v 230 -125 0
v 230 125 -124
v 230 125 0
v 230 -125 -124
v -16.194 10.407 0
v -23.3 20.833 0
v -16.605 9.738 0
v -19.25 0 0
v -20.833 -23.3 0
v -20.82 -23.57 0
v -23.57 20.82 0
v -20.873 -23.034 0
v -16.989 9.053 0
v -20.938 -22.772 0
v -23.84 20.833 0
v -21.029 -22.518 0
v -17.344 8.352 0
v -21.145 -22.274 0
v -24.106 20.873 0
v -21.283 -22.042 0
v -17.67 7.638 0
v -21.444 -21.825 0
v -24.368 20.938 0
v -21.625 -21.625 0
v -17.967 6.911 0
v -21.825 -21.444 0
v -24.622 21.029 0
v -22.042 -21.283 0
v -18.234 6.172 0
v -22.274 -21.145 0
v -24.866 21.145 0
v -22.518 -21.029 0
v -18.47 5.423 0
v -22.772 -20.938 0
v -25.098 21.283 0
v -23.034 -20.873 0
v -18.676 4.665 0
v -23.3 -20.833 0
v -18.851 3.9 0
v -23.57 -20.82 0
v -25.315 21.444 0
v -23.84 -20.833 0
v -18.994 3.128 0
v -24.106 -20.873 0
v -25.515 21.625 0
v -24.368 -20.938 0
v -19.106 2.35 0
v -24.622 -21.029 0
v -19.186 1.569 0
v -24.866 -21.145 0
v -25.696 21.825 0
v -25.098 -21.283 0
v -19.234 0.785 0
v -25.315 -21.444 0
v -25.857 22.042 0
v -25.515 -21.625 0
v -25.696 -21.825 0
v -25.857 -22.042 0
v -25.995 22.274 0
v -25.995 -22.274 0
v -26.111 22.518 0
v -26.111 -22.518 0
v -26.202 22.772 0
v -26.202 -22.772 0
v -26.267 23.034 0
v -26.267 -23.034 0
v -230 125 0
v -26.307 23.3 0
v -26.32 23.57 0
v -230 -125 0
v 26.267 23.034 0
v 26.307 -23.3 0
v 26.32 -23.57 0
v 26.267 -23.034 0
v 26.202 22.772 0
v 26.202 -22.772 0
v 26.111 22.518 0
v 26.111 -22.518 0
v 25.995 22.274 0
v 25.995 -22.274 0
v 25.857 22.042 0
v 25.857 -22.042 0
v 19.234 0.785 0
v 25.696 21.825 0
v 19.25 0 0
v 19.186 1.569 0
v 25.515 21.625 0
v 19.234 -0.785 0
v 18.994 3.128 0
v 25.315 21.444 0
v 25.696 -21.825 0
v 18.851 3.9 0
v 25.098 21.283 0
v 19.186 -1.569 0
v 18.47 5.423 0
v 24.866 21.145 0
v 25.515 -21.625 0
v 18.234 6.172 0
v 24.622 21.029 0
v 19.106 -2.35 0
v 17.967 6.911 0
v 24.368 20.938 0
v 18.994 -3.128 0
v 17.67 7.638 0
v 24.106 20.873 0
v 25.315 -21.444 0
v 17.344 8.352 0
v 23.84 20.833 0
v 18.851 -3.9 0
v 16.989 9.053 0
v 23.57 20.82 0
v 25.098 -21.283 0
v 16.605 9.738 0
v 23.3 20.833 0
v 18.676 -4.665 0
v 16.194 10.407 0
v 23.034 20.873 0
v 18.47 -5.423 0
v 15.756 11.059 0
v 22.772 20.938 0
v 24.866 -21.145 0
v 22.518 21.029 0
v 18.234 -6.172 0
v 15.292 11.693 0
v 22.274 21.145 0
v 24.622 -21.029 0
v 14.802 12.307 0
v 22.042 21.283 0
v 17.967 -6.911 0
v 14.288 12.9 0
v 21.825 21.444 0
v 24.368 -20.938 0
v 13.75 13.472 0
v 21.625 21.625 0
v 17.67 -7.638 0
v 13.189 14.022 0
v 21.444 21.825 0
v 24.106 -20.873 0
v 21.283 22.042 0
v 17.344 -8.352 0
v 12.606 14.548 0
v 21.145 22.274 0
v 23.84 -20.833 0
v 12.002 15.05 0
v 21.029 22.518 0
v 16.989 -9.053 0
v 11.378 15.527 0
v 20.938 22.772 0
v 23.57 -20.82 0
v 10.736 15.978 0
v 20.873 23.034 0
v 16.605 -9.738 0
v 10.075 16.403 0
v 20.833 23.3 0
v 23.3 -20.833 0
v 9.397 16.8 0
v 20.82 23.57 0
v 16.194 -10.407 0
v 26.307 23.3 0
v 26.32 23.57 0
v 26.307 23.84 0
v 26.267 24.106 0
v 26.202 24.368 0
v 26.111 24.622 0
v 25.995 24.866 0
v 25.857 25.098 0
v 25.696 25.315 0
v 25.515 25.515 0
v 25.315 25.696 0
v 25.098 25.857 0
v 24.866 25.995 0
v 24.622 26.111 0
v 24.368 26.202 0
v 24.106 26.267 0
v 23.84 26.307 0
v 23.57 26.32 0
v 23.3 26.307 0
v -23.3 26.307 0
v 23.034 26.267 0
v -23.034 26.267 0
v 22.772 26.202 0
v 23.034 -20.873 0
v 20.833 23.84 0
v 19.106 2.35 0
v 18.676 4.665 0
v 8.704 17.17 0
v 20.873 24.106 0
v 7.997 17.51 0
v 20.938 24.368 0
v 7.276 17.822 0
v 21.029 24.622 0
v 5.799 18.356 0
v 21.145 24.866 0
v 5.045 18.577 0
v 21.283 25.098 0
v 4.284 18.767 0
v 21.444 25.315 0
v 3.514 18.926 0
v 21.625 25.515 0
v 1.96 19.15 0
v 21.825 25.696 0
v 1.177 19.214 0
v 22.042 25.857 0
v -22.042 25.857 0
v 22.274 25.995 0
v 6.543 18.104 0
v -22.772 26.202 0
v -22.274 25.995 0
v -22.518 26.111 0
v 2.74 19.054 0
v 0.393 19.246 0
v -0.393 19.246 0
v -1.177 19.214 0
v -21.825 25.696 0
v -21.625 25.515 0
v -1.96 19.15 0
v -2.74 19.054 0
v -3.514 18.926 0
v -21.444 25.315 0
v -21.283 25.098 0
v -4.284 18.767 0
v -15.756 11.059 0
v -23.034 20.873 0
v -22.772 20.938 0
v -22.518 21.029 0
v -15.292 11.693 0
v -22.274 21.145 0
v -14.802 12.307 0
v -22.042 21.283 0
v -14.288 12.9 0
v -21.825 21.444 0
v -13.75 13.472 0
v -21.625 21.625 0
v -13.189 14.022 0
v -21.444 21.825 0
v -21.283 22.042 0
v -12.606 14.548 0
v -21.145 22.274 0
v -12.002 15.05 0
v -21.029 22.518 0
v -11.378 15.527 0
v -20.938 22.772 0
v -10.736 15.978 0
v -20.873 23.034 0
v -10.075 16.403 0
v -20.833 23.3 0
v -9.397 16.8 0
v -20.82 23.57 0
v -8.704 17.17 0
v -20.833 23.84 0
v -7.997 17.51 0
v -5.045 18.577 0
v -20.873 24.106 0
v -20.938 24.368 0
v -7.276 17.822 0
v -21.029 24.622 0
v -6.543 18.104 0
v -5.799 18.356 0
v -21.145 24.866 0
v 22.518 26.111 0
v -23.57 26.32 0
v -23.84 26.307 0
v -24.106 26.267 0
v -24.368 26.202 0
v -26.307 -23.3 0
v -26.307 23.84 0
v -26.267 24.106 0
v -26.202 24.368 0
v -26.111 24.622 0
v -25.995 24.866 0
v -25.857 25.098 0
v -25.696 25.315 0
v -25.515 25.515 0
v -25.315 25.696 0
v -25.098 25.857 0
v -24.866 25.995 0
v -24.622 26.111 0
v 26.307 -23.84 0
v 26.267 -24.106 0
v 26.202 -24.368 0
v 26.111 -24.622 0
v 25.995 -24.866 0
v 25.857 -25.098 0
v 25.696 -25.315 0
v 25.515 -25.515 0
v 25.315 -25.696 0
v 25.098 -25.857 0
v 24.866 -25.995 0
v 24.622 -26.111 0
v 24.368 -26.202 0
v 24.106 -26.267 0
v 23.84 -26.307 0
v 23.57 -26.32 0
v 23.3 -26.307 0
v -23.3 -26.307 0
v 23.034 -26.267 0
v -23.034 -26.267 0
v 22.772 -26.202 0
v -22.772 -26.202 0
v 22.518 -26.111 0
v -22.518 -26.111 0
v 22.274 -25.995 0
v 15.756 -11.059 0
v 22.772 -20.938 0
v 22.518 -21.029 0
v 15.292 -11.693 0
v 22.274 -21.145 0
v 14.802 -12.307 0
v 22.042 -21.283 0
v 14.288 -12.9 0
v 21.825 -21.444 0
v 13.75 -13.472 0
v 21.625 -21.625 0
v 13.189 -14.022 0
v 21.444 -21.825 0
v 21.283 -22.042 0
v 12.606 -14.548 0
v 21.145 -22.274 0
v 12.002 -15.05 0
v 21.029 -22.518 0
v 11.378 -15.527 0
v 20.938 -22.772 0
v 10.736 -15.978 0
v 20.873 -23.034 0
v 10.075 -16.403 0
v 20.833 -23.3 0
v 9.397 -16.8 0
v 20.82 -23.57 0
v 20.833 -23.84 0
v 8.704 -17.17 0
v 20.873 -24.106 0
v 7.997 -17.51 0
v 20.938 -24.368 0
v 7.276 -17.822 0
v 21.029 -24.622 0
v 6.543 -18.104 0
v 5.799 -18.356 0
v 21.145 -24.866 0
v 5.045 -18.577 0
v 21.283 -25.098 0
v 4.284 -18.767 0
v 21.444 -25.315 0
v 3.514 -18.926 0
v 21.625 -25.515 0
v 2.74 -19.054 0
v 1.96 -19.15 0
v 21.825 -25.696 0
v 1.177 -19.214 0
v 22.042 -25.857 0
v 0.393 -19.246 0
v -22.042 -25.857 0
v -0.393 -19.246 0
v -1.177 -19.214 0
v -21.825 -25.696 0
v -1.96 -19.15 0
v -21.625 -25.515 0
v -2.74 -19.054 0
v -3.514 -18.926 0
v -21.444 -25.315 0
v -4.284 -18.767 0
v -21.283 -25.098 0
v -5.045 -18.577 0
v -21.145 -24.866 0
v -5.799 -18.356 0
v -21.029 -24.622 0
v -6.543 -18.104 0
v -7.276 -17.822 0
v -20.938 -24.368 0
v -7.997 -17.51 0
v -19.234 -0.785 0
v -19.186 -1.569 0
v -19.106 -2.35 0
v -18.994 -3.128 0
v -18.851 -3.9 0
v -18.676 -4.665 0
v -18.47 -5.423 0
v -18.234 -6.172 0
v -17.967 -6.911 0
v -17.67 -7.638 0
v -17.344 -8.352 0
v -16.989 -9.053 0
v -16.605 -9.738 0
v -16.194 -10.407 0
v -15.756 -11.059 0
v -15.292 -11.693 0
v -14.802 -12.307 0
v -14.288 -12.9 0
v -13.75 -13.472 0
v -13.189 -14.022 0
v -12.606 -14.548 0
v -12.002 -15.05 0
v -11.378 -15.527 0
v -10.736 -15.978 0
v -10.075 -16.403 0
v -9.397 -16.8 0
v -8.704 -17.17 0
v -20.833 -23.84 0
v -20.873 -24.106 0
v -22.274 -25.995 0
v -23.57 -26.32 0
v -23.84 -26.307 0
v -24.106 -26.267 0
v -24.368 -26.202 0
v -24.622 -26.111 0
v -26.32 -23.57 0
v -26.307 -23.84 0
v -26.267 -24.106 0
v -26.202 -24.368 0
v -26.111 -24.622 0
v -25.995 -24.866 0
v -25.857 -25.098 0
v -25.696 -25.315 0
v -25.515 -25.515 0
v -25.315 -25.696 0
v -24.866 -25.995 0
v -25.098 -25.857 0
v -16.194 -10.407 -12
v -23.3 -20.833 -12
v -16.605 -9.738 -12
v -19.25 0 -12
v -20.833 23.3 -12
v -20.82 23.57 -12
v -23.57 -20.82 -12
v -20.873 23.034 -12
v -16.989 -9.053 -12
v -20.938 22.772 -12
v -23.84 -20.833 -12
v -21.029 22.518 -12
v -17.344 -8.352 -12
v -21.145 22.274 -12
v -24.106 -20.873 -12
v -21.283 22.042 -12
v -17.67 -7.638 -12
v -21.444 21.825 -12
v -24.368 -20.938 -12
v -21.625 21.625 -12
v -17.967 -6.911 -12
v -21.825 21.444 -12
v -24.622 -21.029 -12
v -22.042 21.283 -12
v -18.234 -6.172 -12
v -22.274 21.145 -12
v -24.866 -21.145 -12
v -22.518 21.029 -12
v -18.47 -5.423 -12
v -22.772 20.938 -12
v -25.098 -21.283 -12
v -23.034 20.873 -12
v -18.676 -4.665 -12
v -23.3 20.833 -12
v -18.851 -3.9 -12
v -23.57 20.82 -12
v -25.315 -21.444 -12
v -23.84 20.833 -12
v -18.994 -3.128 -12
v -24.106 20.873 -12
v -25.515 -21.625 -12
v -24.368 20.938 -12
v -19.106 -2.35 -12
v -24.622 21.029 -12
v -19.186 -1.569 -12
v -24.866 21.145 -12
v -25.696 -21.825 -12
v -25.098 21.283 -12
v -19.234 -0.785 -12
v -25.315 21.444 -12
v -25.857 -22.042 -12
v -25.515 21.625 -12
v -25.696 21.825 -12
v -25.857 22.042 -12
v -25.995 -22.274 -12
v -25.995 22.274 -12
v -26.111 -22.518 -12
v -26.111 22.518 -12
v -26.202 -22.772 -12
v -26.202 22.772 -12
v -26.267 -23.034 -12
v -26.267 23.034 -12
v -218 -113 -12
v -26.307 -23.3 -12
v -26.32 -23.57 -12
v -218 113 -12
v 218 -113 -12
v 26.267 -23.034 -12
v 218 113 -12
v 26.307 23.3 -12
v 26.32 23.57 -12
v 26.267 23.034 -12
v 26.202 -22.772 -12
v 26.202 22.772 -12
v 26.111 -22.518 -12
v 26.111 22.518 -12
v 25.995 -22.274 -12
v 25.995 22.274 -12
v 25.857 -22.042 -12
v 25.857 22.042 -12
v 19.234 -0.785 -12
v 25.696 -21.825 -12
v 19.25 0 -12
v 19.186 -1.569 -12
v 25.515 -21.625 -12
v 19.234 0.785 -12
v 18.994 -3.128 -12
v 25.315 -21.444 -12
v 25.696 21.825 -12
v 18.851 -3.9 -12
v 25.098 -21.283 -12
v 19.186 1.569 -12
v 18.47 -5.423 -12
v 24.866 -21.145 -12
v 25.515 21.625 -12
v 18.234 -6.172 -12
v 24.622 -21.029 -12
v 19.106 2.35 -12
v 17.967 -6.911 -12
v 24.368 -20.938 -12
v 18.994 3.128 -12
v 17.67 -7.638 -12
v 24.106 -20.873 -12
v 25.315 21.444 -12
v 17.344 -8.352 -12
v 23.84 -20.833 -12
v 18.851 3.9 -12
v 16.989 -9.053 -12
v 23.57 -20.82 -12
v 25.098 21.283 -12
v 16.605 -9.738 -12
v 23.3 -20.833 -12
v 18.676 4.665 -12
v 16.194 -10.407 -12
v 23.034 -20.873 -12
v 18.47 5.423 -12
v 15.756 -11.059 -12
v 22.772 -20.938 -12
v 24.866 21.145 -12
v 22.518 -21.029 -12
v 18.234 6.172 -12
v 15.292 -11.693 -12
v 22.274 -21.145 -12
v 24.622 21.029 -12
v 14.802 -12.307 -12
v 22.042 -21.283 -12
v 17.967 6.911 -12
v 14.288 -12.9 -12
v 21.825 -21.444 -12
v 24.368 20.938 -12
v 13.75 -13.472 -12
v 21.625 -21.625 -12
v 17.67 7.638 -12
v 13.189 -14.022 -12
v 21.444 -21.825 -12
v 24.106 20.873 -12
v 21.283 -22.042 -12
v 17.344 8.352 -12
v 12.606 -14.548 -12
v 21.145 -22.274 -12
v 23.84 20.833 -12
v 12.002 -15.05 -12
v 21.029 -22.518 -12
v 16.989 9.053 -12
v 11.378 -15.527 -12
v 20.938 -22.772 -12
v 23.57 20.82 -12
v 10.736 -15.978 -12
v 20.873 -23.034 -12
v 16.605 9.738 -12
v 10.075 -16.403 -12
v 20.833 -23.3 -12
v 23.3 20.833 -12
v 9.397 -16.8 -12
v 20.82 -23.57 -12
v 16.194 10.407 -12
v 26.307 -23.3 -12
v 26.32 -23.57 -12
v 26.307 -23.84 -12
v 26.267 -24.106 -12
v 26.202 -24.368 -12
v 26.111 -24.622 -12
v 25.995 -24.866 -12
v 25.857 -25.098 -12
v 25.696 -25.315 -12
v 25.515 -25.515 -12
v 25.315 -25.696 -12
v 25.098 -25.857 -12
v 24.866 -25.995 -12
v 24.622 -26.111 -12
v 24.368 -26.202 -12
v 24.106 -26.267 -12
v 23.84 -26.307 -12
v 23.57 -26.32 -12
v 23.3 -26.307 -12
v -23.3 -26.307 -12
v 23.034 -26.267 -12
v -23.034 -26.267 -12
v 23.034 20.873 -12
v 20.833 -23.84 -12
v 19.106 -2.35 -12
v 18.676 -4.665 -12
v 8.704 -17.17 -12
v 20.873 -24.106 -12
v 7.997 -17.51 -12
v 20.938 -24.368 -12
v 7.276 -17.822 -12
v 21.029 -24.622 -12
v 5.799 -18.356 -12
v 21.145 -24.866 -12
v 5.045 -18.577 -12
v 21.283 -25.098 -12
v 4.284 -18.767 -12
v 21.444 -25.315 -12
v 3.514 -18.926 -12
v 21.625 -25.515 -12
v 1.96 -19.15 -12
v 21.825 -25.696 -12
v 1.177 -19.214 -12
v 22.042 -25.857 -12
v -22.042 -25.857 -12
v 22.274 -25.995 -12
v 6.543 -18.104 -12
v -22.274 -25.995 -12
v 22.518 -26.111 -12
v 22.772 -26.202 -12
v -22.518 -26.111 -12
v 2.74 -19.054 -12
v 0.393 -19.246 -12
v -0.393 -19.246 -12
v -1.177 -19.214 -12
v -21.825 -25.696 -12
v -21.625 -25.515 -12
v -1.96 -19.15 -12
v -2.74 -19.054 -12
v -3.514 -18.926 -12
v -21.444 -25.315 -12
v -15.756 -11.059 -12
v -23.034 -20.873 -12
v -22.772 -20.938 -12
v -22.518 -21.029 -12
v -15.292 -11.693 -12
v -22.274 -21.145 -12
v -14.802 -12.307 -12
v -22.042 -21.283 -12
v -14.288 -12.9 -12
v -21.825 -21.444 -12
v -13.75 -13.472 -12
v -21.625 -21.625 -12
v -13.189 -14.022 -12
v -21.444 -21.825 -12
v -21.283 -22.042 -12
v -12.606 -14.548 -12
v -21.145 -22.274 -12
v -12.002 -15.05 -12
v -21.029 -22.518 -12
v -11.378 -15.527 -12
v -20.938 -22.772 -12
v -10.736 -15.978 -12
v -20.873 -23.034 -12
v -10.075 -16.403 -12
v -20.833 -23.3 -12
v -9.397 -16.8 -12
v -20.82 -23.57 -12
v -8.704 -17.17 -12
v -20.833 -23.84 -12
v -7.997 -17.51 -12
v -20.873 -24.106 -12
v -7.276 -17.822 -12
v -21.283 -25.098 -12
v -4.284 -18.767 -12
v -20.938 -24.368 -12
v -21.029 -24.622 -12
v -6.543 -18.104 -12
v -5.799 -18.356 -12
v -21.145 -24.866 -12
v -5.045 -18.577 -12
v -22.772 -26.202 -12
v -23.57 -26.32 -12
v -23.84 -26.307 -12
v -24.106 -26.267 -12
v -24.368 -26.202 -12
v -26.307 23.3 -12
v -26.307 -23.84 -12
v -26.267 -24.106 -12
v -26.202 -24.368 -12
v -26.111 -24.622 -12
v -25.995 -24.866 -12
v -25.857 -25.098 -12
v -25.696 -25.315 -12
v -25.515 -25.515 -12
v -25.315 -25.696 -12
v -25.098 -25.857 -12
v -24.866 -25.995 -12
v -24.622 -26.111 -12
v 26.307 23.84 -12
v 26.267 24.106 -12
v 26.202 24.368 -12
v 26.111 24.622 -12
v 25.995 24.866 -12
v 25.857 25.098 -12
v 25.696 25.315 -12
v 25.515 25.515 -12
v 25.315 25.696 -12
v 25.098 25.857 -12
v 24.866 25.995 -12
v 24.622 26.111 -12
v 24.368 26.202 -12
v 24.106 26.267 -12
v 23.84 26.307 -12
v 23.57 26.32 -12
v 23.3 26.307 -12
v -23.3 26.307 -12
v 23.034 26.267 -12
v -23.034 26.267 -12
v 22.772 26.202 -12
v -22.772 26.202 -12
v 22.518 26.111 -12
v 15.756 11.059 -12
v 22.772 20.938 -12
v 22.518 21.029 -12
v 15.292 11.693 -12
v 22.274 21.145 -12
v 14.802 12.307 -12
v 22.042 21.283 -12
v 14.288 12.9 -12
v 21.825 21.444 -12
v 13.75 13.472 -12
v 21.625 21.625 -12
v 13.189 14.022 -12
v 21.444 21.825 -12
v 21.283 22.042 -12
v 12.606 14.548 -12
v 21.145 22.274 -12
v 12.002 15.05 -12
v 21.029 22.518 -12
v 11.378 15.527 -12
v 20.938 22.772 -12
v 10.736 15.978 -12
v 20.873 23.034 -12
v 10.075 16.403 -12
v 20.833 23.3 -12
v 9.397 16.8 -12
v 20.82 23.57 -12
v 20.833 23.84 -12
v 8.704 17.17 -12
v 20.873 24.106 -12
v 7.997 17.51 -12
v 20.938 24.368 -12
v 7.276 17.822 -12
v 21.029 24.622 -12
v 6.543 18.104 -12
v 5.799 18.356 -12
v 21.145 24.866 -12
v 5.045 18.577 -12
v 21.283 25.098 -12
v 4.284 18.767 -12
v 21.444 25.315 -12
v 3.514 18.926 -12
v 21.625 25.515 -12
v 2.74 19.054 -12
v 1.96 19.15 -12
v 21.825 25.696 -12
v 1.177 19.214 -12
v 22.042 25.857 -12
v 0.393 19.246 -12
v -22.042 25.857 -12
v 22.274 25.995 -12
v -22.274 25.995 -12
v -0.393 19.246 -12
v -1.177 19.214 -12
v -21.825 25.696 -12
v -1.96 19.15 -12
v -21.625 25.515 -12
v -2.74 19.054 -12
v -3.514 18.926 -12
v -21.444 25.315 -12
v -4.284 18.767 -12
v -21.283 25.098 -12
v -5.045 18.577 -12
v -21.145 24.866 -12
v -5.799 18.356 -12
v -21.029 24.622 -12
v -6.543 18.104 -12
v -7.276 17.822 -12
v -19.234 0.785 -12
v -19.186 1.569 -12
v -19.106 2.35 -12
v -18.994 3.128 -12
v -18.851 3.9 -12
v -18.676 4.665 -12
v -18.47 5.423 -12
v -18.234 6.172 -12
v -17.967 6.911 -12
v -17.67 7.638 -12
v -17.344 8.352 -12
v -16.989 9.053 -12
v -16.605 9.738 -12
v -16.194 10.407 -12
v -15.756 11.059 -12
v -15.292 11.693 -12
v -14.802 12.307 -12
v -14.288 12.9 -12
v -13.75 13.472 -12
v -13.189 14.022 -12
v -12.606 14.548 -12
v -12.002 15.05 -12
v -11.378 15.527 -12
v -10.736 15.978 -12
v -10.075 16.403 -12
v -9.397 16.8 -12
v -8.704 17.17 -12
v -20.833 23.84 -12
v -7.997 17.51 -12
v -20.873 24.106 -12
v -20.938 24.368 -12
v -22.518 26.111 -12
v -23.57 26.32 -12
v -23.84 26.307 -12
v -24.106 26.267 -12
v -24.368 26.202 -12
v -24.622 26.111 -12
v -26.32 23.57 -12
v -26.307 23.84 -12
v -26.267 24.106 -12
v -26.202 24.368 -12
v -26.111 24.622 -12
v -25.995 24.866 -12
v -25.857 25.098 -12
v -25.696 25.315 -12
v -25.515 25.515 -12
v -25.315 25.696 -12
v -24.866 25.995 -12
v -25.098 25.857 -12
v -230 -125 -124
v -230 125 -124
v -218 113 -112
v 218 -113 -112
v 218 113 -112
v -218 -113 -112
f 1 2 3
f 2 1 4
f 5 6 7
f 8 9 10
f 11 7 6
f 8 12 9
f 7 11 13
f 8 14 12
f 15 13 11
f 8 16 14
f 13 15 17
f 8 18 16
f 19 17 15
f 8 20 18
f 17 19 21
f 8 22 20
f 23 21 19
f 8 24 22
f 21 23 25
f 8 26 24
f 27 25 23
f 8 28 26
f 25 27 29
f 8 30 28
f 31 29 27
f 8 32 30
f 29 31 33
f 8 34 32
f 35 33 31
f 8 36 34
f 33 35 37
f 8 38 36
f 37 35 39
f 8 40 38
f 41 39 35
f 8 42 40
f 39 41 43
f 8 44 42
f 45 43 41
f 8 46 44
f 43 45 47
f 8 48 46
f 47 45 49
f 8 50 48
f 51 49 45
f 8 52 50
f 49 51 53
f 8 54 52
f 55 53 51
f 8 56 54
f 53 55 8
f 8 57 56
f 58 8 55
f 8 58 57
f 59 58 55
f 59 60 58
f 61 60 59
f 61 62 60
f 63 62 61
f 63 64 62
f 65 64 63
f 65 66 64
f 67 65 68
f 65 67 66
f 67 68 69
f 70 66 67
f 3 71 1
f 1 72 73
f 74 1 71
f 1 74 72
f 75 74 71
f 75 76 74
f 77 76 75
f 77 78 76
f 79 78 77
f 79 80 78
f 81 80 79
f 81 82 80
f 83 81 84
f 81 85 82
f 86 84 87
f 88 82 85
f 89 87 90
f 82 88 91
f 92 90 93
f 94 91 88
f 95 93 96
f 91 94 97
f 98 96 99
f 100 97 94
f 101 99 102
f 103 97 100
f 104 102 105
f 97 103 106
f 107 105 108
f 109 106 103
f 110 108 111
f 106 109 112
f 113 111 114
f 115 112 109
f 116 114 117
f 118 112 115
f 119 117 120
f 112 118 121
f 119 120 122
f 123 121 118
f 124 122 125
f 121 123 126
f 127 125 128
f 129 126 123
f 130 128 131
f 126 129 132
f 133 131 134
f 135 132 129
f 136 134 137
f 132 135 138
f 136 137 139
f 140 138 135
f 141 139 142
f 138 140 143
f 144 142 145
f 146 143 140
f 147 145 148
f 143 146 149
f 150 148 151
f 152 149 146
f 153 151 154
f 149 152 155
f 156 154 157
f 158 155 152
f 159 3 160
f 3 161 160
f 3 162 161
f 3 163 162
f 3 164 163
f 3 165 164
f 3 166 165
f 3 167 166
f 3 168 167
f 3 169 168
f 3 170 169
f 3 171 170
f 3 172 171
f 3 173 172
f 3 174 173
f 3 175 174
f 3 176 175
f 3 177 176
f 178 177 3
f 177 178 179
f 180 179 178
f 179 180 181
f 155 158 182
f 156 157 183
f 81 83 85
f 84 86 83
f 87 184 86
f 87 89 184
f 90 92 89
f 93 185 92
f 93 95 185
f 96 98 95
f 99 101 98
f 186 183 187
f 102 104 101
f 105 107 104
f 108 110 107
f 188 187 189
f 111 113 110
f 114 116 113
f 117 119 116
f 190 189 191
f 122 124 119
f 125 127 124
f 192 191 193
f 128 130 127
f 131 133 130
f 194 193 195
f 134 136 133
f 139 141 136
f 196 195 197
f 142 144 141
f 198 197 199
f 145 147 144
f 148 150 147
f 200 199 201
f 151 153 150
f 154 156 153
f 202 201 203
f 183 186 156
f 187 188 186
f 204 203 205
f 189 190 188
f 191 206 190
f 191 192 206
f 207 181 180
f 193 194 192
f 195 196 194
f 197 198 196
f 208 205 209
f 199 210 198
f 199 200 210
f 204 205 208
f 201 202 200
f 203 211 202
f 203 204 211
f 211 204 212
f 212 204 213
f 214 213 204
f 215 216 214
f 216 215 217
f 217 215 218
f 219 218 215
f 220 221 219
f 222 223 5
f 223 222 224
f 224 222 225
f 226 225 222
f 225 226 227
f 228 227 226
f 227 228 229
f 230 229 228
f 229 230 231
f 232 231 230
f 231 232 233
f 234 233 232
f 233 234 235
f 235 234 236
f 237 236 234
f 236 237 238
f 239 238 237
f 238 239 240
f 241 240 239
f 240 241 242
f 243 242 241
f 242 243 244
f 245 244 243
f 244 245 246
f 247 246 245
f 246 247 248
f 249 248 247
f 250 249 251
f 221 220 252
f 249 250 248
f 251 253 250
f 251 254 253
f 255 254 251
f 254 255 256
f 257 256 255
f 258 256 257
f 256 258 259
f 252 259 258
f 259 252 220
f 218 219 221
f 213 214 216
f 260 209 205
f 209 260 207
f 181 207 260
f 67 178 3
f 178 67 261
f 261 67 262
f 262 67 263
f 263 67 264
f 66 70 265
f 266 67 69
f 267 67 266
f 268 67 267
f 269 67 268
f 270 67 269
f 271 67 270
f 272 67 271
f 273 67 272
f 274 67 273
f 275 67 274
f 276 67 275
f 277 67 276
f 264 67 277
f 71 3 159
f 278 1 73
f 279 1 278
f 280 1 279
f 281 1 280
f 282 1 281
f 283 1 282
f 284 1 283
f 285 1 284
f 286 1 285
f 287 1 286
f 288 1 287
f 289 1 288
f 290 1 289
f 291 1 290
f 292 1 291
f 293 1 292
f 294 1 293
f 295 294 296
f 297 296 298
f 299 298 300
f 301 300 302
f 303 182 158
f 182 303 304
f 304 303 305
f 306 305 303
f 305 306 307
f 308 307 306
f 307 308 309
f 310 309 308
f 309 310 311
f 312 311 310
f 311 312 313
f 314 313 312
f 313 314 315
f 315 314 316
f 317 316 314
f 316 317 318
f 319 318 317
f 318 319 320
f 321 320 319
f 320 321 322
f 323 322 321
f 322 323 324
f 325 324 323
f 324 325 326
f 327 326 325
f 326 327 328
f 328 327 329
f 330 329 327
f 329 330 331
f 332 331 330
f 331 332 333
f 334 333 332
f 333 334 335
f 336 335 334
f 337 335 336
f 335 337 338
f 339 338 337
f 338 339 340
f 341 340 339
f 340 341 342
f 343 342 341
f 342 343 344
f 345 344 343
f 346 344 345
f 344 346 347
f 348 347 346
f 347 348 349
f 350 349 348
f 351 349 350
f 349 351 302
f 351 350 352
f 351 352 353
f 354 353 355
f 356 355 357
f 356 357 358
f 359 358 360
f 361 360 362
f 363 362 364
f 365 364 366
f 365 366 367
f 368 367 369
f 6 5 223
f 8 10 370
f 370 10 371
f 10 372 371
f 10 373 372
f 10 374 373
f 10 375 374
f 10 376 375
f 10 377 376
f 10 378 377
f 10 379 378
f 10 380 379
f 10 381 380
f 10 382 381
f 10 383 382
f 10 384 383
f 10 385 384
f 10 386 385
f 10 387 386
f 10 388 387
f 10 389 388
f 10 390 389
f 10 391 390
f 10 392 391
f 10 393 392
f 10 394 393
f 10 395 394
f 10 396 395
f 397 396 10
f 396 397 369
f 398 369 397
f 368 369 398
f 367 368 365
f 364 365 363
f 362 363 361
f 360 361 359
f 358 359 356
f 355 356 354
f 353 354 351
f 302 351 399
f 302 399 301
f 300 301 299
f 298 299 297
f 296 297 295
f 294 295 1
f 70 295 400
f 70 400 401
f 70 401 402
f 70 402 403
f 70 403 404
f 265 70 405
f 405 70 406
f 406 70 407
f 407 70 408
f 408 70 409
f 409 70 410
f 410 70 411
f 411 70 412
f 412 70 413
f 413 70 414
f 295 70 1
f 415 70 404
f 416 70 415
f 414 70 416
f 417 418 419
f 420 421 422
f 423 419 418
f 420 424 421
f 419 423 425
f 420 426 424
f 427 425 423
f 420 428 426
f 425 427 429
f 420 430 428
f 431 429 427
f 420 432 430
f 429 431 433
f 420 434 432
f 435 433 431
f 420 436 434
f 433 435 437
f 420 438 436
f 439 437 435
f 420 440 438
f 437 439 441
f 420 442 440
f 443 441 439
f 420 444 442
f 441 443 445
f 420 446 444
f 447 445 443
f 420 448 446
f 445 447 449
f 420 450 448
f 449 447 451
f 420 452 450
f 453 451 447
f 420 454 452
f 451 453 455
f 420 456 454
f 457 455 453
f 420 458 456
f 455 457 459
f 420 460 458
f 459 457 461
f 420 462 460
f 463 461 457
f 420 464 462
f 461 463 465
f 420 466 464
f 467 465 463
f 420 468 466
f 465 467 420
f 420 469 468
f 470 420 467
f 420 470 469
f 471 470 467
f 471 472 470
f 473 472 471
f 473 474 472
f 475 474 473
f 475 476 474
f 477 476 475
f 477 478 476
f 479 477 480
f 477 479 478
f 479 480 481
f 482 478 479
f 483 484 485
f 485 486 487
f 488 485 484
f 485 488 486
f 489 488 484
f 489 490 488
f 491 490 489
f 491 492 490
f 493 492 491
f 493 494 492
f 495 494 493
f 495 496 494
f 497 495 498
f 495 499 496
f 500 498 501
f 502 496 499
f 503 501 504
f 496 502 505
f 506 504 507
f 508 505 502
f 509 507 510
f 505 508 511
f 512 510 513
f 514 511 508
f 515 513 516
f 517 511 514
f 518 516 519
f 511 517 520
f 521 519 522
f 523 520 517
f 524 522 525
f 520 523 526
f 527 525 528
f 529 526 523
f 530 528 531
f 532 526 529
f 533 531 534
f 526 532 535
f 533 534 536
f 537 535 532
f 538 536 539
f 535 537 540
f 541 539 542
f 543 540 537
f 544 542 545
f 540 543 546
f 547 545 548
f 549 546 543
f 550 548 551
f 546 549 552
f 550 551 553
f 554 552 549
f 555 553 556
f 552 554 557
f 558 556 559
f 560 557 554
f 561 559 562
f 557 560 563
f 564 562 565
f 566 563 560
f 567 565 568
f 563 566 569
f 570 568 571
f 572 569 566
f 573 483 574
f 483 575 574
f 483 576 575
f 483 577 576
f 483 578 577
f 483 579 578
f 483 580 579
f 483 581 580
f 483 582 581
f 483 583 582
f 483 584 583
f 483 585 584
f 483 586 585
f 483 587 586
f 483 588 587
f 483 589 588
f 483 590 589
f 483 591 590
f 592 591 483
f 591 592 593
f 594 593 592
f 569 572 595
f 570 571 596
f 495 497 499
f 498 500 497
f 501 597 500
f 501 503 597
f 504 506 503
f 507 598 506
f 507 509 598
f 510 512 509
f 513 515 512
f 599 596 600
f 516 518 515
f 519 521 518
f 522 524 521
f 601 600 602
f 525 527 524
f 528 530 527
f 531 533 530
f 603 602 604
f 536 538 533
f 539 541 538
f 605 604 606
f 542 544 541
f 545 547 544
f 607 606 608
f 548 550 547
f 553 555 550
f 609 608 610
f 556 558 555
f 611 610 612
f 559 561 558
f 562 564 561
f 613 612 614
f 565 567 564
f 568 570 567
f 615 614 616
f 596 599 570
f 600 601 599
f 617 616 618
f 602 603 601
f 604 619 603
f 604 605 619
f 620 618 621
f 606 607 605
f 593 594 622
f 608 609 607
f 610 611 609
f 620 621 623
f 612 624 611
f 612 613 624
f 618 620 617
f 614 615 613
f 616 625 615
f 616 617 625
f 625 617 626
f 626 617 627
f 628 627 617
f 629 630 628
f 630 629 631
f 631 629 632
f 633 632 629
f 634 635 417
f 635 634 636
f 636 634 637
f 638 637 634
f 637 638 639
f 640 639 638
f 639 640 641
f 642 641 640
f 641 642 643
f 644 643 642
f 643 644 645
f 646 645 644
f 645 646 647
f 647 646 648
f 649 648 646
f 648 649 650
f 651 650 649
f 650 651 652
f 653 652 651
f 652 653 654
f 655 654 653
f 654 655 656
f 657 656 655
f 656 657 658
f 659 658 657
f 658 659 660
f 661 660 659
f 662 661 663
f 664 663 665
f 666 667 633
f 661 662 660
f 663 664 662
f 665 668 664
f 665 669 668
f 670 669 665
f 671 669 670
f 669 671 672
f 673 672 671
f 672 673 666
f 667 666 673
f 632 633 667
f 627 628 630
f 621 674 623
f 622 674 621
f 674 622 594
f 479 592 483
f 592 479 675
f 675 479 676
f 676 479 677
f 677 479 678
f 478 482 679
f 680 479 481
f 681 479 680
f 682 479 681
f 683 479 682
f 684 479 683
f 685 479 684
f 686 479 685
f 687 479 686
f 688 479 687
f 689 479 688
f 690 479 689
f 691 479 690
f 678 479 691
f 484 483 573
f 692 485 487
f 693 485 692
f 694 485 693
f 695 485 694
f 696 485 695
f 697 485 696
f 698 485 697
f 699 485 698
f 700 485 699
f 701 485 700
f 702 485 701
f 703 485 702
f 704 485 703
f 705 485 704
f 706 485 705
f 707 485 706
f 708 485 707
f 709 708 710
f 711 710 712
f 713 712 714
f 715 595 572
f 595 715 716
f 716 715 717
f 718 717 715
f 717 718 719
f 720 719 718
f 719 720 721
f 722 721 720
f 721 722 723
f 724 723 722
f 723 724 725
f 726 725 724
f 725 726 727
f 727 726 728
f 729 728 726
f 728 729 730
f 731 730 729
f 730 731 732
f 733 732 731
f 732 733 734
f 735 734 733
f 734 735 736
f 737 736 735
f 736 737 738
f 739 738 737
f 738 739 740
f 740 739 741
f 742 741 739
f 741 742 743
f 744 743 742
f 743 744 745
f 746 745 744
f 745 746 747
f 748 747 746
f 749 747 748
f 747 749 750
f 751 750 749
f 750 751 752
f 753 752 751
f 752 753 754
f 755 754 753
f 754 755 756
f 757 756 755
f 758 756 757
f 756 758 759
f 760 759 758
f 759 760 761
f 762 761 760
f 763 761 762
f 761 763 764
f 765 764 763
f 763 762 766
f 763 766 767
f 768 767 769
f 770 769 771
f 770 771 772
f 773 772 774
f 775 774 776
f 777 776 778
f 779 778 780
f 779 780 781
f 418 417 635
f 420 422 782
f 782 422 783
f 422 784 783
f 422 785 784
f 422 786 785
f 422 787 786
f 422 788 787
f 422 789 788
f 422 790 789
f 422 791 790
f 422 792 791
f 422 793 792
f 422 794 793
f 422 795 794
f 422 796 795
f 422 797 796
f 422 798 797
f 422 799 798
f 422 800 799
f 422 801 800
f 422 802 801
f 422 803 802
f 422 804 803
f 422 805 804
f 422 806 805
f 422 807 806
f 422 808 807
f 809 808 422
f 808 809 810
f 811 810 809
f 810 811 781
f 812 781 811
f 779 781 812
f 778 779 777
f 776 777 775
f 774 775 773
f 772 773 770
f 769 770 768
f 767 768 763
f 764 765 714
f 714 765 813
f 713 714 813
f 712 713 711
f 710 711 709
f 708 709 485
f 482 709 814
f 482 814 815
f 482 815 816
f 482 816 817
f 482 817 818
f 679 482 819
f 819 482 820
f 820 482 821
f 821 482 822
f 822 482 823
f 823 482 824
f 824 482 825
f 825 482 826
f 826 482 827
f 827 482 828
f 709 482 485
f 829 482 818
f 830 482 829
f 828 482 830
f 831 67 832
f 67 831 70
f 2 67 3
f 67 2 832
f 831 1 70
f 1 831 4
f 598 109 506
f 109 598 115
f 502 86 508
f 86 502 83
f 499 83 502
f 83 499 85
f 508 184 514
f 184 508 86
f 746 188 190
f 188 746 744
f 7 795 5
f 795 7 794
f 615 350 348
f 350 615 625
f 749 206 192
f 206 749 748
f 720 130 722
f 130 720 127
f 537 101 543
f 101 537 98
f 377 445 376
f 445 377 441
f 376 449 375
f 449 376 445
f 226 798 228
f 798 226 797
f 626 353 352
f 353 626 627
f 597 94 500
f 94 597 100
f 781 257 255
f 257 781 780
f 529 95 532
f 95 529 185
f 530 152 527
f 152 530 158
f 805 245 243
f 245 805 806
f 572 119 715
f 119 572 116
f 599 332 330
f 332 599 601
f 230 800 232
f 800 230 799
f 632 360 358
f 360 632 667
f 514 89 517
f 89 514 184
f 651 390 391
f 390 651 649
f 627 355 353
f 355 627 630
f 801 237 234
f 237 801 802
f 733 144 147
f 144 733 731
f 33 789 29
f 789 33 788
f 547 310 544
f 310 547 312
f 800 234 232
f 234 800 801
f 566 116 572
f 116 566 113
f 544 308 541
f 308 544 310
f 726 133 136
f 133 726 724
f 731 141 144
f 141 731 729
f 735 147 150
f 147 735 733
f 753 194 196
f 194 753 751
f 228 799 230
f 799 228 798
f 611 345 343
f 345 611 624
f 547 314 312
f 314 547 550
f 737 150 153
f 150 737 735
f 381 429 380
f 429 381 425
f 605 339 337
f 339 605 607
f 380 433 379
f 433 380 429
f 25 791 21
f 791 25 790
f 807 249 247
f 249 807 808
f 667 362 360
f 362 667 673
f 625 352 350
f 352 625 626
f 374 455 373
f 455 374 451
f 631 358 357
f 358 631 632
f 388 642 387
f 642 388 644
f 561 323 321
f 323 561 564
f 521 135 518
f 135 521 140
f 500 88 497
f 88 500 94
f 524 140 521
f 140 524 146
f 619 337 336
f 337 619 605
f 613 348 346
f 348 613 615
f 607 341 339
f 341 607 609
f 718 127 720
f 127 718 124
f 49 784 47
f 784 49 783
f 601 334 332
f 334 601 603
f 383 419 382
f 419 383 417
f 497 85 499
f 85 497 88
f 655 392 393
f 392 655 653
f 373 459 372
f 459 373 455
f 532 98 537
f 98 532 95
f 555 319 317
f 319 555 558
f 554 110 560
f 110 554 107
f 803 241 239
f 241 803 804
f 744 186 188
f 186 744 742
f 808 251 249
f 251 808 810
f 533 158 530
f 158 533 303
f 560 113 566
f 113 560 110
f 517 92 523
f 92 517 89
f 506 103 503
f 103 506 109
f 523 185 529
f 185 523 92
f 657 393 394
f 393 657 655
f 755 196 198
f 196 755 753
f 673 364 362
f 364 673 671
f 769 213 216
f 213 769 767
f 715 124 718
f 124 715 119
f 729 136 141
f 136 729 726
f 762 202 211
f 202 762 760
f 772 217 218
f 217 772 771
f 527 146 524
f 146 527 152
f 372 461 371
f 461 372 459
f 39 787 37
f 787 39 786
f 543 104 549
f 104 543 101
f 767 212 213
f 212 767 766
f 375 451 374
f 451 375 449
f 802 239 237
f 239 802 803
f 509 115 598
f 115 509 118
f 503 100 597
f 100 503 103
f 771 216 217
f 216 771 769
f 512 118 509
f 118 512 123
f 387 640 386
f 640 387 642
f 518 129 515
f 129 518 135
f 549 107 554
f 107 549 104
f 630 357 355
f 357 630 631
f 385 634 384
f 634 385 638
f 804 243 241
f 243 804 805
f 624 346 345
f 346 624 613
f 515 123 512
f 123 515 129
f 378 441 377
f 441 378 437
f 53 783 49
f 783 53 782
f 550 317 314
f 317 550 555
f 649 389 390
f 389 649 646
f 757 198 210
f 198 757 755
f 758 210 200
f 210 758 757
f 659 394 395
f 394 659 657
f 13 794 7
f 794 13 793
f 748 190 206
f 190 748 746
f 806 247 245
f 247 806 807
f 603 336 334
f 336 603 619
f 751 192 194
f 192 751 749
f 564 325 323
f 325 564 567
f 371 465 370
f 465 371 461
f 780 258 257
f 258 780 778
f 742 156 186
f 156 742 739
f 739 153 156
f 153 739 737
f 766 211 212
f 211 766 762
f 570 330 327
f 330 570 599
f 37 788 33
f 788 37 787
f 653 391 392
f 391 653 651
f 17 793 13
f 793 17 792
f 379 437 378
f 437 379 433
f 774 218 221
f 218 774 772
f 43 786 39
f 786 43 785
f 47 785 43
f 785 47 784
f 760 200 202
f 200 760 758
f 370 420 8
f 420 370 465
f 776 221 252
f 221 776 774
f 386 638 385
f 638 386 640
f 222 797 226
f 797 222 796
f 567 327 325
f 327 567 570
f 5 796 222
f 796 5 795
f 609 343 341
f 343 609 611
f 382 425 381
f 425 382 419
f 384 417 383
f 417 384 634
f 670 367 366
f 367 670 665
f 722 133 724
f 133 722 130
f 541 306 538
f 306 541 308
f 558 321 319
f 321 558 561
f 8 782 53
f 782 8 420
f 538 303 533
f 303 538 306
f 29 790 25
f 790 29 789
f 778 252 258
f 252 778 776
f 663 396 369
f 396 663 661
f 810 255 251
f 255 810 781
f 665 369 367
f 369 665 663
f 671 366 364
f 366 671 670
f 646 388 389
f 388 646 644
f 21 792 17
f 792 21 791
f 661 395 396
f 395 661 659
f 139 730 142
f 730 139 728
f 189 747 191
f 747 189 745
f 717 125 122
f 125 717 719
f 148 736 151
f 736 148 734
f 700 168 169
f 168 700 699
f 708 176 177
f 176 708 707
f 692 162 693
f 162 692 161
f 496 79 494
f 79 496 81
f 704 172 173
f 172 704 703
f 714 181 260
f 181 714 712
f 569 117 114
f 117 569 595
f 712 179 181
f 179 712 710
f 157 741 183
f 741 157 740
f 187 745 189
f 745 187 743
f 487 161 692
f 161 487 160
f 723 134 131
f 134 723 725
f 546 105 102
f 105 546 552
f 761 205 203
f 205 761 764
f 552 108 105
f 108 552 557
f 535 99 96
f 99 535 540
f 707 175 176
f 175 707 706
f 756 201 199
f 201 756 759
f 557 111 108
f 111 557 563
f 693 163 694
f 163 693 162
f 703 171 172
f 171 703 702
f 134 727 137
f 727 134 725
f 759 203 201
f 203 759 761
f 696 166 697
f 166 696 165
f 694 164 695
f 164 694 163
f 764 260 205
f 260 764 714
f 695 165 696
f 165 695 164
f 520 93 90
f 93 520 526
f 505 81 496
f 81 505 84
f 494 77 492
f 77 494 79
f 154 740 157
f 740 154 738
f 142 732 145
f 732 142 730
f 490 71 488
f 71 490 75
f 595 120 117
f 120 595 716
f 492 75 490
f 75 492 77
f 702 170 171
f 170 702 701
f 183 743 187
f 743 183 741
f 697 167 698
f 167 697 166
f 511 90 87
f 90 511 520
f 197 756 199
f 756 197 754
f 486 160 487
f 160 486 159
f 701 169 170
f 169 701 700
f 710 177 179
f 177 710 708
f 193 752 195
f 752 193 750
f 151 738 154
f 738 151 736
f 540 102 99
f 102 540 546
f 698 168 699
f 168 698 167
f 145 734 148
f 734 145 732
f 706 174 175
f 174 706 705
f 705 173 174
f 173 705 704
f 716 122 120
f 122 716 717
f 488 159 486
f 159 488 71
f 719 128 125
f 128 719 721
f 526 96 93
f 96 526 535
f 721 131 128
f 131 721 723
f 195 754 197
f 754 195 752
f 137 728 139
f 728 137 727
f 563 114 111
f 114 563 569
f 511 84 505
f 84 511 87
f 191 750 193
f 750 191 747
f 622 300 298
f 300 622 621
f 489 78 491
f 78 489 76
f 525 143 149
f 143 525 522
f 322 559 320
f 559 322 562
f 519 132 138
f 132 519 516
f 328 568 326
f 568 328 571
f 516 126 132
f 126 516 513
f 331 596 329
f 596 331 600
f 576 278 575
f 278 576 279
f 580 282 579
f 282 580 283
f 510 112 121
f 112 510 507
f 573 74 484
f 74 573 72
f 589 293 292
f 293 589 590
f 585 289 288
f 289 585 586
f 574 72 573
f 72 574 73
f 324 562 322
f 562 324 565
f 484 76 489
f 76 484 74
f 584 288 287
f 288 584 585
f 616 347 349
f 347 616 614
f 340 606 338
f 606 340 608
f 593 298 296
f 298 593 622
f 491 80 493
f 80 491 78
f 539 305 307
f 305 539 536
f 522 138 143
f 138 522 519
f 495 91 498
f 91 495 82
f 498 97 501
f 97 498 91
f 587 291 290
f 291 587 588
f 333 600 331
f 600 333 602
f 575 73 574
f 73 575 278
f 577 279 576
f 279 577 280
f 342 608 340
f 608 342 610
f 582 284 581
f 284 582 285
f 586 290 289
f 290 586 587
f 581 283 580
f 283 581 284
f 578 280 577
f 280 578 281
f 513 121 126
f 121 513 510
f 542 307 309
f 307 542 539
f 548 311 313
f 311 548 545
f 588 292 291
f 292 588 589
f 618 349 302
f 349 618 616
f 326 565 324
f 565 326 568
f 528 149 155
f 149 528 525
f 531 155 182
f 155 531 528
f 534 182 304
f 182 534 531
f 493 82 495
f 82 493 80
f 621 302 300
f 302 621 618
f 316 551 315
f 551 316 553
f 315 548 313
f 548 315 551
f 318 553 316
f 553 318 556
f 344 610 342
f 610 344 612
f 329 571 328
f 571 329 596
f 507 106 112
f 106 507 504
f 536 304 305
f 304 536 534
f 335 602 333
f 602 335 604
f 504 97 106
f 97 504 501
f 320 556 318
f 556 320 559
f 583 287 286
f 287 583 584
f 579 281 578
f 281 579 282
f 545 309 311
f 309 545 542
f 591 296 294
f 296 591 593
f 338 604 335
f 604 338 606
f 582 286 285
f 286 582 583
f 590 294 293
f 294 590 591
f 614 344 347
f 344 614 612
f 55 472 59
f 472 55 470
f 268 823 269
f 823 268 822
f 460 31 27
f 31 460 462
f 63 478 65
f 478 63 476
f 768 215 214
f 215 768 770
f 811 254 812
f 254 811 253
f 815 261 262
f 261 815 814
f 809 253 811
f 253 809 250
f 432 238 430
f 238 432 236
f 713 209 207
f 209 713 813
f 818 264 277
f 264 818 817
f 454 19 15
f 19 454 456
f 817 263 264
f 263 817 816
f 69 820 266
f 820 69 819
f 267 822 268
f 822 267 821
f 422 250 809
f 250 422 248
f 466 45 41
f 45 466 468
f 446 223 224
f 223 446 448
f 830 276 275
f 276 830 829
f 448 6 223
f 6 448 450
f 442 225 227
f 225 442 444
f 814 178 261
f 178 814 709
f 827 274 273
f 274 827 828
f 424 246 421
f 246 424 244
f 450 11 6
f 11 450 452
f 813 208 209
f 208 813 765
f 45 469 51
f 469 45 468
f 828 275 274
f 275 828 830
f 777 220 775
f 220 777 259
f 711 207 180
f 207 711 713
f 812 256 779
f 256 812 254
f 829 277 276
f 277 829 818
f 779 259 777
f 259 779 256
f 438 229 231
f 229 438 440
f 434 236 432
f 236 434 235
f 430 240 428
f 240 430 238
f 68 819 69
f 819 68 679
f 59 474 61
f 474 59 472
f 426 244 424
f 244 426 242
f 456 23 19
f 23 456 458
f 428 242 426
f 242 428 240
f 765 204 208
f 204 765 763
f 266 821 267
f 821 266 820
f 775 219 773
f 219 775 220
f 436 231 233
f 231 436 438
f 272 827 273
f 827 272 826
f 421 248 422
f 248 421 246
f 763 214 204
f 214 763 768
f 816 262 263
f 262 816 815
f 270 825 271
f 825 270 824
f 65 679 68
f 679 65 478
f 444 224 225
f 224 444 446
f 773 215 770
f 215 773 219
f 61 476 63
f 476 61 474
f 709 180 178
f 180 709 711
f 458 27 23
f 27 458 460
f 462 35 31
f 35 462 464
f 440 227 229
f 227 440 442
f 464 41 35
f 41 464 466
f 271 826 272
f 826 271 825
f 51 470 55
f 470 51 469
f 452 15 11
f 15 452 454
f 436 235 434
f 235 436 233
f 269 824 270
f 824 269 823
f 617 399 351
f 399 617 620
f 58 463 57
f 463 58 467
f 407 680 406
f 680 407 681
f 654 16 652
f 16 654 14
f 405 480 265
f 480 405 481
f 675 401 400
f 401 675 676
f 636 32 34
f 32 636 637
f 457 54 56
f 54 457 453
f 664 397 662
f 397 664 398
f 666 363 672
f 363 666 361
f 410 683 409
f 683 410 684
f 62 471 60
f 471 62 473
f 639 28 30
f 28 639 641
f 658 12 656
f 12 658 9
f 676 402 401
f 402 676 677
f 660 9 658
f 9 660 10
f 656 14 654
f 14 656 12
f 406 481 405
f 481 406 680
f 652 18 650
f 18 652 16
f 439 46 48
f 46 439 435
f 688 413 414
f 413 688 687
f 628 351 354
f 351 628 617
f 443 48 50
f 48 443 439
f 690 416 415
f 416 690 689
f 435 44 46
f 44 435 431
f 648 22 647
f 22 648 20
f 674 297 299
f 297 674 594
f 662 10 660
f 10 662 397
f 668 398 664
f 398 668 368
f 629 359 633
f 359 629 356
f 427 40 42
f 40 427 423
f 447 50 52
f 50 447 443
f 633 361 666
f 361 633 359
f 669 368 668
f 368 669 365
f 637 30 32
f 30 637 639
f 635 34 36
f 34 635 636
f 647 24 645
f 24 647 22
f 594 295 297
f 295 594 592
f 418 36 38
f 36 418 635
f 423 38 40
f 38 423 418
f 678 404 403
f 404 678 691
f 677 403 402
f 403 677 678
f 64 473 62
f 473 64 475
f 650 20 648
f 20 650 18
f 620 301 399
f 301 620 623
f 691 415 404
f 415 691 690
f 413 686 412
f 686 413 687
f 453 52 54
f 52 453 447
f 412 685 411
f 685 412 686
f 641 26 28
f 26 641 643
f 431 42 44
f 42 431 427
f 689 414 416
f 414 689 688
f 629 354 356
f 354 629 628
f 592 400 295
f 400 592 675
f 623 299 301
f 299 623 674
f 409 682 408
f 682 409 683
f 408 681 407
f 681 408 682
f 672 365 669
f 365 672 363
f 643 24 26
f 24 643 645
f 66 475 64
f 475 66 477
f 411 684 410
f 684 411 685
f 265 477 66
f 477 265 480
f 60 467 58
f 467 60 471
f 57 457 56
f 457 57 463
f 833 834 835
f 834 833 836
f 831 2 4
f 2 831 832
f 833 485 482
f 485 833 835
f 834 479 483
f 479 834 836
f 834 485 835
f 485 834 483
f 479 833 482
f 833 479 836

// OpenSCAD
module BottomPlate(){
  translate([-230, -125, 0])cube([460, 250, 12.0]);}
module BoxSide1(){
  translate([-230, -6, 0])cube([460, 12, 100.0]);}
module BoxSide2(){
  translate([-6, -113, 0])cube([12, 226, 100.0]);}
module BoxTop(){
  difference(){
    translate([-230, -125, 0])cube([460, 250, 12.0]);
    translate([0, 0, -0.1])cylinder(d=38.5,h=12.2,$fn=154);
    translate([0, 0, -0.1])translate([23.57, 23.57, 0])cylinder(d=5.5,h=12.2,$fn=64);
    translate([0, 0, -0.1])translate([23.57, -23.57, 0])cylinder(d=5.5,h=12.2,$fn=64);
    translate([0, 0, -0.1])translate([-23.57, 23.57, 0])cylinder(d=5.5,h=12.2,$fn=64);
    translate([0, 0, -0.1])translate([-23.57, -23.57, 0])cylinder(d=5.5,h=12.2,$fn=64);
  }
}
$fn=64;
translate([0, 0, -124])union(){
    color("Teal")BottomPlate();
    translate([0, 119, 12])color("HotPink")BoxSide1();
    translate([0, -119, 12])color("DarkOrchid")BoxSide1();
    translate([224, 0, 12])color("MediumVioletRed")BoxSide2();
    translate([-224, 0, 12])color("OrangeRed")BoxSide2();
    translate([0, 0, 112])color("LightCoral")BoxTop();
  }
